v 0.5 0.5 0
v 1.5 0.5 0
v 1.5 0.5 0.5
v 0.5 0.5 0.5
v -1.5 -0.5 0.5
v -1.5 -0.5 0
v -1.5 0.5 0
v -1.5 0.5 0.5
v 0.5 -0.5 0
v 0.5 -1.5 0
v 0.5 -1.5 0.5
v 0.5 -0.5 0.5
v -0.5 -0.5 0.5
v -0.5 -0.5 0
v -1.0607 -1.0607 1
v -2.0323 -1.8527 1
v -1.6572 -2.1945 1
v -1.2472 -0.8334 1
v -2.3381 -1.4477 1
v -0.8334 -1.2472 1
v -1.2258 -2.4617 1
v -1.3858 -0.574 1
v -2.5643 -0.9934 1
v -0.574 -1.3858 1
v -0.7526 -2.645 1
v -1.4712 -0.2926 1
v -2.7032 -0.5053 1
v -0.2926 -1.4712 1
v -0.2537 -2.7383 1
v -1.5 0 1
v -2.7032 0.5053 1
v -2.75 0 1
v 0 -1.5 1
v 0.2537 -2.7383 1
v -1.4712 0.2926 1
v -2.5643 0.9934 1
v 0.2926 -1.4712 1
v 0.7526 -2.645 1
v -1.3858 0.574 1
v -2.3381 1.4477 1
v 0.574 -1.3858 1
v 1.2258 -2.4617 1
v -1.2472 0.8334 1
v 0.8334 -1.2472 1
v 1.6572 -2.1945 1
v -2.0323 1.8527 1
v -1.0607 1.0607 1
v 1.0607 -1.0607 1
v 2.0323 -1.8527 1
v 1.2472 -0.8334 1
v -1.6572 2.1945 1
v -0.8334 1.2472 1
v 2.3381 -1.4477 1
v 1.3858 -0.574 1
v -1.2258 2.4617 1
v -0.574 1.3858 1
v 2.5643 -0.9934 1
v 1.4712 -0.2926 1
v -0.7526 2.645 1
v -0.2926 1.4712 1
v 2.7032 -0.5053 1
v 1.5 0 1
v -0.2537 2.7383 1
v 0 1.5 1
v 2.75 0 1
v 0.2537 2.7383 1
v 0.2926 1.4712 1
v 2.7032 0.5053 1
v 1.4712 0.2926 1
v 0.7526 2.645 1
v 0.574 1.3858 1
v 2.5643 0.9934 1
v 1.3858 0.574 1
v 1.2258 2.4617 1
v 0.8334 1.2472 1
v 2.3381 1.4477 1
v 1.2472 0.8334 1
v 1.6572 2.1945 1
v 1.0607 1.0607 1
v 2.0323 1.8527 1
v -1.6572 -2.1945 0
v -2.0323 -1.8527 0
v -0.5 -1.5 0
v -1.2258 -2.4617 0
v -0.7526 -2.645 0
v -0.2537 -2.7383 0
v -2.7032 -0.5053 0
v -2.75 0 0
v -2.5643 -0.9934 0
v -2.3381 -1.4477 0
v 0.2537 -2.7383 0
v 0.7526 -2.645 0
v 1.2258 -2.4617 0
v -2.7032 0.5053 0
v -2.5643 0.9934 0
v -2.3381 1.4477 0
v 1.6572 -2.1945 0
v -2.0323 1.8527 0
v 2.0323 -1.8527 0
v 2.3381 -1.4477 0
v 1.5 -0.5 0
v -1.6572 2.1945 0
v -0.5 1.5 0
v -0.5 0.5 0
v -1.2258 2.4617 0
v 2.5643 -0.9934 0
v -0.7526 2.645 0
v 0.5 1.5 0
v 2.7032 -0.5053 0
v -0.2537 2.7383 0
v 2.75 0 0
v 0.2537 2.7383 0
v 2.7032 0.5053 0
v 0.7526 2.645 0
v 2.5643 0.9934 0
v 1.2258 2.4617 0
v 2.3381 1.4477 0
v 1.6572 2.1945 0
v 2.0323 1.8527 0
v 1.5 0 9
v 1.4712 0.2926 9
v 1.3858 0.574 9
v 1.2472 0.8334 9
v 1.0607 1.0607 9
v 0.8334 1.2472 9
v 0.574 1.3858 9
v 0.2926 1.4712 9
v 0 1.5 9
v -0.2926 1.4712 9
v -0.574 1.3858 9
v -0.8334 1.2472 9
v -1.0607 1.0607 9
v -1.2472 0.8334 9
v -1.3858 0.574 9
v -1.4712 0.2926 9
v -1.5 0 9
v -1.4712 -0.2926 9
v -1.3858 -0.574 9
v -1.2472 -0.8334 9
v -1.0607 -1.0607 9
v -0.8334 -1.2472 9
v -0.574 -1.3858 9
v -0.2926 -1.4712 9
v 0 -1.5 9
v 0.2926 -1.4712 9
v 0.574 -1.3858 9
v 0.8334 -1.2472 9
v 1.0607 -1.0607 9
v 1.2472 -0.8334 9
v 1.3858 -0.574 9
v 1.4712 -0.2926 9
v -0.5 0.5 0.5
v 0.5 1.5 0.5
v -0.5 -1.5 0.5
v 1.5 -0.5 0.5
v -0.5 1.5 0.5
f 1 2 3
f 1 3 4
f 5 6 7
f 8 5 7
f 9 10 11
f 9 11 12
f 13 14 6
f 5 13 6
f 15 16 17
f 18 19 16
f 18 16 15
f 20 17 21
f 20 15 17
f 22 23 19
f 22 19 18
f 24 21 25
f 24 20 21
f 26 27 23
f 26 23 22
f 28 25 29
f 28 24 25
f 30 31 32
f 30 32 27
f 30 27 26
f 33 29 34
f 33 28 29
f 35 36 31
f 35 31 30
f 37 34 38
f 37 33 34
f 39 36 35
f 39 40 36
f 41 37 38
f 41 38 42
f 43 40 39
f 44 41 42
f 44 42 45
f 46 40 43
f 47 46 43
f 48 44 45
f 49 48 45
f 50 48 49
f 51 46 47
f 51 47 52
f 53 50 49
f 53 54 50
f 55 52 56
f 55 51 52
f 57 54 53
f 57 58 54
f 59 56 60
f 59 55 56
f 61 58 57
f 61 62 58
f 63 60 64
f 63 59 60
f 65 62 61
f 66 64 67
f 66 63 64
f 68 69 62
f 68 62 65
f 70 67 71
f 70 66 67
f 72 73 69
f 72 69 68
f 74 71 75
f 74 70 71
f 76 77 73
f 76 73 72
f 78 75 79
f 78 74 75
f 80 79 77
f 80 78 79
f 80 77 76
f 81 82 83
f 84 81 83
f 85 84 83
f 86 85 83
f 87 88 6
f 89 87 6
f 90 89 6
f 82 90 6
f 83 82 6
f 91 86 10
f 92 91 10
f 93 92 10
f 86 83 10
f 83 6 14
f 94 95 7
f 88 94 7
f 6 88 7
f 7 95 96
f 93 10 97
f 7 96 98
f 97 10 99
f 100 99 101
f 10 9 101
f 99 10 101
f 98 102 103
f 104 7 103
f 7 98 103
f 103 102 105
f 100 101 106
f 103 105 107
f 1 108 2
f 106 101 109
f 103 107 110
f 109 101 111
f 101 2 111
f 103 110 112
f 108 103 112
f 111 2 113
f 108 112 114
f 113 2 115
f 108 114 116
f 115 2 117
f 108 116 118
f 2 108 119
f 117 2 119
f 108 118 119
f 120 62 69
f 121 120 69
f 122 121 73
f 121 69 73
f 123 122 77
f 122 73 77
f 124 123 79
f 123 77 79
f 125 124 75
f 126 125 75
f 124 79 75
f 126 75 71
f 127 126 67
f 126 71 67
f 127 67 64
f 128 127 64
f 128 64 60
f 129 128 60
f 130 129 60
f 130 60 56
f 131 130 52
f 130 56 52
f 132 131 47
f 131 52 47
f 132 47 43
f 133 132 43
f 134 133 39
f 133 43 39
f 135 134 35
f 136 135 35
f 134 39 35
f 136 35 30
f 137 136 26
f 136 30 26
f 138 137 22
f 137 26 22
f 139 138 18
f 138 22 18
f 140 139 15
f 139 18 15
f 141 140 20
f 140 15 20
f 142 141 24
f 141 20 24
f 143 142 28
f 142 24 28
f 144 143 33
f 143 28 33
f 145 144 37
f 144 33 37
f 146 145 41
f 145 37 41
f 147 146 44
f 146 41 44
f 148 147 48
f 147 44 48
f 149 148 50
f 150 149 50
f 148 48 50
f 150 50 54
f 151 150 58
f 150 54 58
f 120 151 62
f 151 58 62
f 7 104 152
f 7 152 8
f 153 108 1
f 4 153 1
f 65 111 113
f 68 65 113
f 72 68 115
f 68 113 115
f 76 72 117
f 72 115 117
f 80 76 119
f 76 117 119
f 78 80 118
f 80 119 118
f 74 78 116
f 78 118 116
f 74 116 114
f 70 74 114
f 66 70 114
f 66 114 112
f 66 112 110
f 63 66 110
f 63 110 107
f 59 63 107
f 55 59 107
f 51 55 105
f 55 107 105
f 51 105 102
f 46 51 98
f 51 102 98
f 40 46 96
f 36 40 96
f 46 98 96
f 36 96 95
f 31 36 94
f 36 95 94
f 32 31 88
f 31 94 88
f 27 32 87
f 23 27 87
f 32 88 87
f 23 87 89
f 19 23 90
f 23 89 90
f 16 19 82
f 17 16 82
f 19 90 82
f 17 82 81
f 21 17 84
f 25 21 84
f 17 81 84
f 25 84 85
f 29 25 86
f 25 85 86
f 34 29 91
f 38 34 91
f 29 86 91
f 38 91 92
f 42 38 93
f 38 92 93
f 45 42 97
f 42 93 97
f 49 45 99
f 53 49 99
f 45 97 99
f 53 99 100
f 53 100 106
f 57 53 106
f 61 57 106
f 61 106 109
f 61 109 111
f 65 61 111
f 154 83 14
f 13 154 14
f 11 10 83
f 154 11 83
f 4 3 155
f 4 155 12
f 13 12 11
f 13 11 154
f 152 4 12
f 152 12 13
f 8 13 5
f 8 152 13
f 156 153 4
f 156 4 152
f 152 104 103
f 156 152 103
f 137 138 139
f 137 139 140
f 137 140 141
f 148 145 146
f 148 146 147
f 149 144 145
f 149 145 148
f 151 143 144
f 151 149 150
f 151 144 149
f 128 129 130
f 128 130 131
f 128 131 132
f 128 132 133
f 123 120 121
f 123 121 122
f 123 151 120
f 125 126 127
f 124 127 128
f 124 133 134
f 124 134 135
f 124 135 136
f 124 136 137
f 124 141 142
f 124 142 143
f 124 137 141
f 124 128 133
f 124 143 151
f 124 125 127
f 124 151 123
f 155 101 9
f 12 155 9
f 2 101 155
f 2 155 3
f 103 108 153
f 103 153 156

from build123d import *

# Parameters (mm, degrees)
SKETCH_1_R          = 2.75
EXTRUDE_1_DEPTH     = 1
SKETCH_2_R          = 1.5
EXTRUDE_2_DEPTH     = 8
SKETCH_3_W          = 1
SKETCH_3_H          = 1
CUT_EXTRUDE_1_DEPTH = 0.5


with BuildPart() as part:
    # ｽｹｯﾁ1 → ﾎﾞｽ - 押し出し1 (new body)
    with BuildSketch(Plane.XY):
        Circle(SKETCH_1_R)
    extrude(amount=EXTRUDE_1_DEPTH)

    # ｽｹｯﾁ2 → ﾎﾞｽ - 押し出し2 (add)
    with BuildSketch(Plane.XY.offset(1)):
        Circle(SKETCH_2_R)
    extrude(amount=EXTRUDE_2_DEPTH)

    # ｽｹｯﾁ3 → ｶｯﾄ - 押し出し1 (cut)
    with BuildSketch(Plane(origin=(0, 0, 0), x_dir=(-1, 0, 0), z_dir=(0, 0, -1))):
        with Locations((0, 1)):
            Rectangle(SKETCH_3_W, SKETCH_3_H)
        Rectangle(SKETCH_3_W, SKETCH_3_H)
        with Locations((1, 0)):
            Rectangle(SKETCH_3_W, SKETCH_3_H)
        with Locations((-1, 0)):
            Rectangle(SKETCH_3_W, SKETCH_3_H)
        with Locations((0, -1)):
            Rectangle(SKETCH_3_W, SKETCH_3_H)
    extrude(amount=-CUT_EXTRUDE_1_DEPTH, mode=Mode.SUBTRACT)


solid = part.part
